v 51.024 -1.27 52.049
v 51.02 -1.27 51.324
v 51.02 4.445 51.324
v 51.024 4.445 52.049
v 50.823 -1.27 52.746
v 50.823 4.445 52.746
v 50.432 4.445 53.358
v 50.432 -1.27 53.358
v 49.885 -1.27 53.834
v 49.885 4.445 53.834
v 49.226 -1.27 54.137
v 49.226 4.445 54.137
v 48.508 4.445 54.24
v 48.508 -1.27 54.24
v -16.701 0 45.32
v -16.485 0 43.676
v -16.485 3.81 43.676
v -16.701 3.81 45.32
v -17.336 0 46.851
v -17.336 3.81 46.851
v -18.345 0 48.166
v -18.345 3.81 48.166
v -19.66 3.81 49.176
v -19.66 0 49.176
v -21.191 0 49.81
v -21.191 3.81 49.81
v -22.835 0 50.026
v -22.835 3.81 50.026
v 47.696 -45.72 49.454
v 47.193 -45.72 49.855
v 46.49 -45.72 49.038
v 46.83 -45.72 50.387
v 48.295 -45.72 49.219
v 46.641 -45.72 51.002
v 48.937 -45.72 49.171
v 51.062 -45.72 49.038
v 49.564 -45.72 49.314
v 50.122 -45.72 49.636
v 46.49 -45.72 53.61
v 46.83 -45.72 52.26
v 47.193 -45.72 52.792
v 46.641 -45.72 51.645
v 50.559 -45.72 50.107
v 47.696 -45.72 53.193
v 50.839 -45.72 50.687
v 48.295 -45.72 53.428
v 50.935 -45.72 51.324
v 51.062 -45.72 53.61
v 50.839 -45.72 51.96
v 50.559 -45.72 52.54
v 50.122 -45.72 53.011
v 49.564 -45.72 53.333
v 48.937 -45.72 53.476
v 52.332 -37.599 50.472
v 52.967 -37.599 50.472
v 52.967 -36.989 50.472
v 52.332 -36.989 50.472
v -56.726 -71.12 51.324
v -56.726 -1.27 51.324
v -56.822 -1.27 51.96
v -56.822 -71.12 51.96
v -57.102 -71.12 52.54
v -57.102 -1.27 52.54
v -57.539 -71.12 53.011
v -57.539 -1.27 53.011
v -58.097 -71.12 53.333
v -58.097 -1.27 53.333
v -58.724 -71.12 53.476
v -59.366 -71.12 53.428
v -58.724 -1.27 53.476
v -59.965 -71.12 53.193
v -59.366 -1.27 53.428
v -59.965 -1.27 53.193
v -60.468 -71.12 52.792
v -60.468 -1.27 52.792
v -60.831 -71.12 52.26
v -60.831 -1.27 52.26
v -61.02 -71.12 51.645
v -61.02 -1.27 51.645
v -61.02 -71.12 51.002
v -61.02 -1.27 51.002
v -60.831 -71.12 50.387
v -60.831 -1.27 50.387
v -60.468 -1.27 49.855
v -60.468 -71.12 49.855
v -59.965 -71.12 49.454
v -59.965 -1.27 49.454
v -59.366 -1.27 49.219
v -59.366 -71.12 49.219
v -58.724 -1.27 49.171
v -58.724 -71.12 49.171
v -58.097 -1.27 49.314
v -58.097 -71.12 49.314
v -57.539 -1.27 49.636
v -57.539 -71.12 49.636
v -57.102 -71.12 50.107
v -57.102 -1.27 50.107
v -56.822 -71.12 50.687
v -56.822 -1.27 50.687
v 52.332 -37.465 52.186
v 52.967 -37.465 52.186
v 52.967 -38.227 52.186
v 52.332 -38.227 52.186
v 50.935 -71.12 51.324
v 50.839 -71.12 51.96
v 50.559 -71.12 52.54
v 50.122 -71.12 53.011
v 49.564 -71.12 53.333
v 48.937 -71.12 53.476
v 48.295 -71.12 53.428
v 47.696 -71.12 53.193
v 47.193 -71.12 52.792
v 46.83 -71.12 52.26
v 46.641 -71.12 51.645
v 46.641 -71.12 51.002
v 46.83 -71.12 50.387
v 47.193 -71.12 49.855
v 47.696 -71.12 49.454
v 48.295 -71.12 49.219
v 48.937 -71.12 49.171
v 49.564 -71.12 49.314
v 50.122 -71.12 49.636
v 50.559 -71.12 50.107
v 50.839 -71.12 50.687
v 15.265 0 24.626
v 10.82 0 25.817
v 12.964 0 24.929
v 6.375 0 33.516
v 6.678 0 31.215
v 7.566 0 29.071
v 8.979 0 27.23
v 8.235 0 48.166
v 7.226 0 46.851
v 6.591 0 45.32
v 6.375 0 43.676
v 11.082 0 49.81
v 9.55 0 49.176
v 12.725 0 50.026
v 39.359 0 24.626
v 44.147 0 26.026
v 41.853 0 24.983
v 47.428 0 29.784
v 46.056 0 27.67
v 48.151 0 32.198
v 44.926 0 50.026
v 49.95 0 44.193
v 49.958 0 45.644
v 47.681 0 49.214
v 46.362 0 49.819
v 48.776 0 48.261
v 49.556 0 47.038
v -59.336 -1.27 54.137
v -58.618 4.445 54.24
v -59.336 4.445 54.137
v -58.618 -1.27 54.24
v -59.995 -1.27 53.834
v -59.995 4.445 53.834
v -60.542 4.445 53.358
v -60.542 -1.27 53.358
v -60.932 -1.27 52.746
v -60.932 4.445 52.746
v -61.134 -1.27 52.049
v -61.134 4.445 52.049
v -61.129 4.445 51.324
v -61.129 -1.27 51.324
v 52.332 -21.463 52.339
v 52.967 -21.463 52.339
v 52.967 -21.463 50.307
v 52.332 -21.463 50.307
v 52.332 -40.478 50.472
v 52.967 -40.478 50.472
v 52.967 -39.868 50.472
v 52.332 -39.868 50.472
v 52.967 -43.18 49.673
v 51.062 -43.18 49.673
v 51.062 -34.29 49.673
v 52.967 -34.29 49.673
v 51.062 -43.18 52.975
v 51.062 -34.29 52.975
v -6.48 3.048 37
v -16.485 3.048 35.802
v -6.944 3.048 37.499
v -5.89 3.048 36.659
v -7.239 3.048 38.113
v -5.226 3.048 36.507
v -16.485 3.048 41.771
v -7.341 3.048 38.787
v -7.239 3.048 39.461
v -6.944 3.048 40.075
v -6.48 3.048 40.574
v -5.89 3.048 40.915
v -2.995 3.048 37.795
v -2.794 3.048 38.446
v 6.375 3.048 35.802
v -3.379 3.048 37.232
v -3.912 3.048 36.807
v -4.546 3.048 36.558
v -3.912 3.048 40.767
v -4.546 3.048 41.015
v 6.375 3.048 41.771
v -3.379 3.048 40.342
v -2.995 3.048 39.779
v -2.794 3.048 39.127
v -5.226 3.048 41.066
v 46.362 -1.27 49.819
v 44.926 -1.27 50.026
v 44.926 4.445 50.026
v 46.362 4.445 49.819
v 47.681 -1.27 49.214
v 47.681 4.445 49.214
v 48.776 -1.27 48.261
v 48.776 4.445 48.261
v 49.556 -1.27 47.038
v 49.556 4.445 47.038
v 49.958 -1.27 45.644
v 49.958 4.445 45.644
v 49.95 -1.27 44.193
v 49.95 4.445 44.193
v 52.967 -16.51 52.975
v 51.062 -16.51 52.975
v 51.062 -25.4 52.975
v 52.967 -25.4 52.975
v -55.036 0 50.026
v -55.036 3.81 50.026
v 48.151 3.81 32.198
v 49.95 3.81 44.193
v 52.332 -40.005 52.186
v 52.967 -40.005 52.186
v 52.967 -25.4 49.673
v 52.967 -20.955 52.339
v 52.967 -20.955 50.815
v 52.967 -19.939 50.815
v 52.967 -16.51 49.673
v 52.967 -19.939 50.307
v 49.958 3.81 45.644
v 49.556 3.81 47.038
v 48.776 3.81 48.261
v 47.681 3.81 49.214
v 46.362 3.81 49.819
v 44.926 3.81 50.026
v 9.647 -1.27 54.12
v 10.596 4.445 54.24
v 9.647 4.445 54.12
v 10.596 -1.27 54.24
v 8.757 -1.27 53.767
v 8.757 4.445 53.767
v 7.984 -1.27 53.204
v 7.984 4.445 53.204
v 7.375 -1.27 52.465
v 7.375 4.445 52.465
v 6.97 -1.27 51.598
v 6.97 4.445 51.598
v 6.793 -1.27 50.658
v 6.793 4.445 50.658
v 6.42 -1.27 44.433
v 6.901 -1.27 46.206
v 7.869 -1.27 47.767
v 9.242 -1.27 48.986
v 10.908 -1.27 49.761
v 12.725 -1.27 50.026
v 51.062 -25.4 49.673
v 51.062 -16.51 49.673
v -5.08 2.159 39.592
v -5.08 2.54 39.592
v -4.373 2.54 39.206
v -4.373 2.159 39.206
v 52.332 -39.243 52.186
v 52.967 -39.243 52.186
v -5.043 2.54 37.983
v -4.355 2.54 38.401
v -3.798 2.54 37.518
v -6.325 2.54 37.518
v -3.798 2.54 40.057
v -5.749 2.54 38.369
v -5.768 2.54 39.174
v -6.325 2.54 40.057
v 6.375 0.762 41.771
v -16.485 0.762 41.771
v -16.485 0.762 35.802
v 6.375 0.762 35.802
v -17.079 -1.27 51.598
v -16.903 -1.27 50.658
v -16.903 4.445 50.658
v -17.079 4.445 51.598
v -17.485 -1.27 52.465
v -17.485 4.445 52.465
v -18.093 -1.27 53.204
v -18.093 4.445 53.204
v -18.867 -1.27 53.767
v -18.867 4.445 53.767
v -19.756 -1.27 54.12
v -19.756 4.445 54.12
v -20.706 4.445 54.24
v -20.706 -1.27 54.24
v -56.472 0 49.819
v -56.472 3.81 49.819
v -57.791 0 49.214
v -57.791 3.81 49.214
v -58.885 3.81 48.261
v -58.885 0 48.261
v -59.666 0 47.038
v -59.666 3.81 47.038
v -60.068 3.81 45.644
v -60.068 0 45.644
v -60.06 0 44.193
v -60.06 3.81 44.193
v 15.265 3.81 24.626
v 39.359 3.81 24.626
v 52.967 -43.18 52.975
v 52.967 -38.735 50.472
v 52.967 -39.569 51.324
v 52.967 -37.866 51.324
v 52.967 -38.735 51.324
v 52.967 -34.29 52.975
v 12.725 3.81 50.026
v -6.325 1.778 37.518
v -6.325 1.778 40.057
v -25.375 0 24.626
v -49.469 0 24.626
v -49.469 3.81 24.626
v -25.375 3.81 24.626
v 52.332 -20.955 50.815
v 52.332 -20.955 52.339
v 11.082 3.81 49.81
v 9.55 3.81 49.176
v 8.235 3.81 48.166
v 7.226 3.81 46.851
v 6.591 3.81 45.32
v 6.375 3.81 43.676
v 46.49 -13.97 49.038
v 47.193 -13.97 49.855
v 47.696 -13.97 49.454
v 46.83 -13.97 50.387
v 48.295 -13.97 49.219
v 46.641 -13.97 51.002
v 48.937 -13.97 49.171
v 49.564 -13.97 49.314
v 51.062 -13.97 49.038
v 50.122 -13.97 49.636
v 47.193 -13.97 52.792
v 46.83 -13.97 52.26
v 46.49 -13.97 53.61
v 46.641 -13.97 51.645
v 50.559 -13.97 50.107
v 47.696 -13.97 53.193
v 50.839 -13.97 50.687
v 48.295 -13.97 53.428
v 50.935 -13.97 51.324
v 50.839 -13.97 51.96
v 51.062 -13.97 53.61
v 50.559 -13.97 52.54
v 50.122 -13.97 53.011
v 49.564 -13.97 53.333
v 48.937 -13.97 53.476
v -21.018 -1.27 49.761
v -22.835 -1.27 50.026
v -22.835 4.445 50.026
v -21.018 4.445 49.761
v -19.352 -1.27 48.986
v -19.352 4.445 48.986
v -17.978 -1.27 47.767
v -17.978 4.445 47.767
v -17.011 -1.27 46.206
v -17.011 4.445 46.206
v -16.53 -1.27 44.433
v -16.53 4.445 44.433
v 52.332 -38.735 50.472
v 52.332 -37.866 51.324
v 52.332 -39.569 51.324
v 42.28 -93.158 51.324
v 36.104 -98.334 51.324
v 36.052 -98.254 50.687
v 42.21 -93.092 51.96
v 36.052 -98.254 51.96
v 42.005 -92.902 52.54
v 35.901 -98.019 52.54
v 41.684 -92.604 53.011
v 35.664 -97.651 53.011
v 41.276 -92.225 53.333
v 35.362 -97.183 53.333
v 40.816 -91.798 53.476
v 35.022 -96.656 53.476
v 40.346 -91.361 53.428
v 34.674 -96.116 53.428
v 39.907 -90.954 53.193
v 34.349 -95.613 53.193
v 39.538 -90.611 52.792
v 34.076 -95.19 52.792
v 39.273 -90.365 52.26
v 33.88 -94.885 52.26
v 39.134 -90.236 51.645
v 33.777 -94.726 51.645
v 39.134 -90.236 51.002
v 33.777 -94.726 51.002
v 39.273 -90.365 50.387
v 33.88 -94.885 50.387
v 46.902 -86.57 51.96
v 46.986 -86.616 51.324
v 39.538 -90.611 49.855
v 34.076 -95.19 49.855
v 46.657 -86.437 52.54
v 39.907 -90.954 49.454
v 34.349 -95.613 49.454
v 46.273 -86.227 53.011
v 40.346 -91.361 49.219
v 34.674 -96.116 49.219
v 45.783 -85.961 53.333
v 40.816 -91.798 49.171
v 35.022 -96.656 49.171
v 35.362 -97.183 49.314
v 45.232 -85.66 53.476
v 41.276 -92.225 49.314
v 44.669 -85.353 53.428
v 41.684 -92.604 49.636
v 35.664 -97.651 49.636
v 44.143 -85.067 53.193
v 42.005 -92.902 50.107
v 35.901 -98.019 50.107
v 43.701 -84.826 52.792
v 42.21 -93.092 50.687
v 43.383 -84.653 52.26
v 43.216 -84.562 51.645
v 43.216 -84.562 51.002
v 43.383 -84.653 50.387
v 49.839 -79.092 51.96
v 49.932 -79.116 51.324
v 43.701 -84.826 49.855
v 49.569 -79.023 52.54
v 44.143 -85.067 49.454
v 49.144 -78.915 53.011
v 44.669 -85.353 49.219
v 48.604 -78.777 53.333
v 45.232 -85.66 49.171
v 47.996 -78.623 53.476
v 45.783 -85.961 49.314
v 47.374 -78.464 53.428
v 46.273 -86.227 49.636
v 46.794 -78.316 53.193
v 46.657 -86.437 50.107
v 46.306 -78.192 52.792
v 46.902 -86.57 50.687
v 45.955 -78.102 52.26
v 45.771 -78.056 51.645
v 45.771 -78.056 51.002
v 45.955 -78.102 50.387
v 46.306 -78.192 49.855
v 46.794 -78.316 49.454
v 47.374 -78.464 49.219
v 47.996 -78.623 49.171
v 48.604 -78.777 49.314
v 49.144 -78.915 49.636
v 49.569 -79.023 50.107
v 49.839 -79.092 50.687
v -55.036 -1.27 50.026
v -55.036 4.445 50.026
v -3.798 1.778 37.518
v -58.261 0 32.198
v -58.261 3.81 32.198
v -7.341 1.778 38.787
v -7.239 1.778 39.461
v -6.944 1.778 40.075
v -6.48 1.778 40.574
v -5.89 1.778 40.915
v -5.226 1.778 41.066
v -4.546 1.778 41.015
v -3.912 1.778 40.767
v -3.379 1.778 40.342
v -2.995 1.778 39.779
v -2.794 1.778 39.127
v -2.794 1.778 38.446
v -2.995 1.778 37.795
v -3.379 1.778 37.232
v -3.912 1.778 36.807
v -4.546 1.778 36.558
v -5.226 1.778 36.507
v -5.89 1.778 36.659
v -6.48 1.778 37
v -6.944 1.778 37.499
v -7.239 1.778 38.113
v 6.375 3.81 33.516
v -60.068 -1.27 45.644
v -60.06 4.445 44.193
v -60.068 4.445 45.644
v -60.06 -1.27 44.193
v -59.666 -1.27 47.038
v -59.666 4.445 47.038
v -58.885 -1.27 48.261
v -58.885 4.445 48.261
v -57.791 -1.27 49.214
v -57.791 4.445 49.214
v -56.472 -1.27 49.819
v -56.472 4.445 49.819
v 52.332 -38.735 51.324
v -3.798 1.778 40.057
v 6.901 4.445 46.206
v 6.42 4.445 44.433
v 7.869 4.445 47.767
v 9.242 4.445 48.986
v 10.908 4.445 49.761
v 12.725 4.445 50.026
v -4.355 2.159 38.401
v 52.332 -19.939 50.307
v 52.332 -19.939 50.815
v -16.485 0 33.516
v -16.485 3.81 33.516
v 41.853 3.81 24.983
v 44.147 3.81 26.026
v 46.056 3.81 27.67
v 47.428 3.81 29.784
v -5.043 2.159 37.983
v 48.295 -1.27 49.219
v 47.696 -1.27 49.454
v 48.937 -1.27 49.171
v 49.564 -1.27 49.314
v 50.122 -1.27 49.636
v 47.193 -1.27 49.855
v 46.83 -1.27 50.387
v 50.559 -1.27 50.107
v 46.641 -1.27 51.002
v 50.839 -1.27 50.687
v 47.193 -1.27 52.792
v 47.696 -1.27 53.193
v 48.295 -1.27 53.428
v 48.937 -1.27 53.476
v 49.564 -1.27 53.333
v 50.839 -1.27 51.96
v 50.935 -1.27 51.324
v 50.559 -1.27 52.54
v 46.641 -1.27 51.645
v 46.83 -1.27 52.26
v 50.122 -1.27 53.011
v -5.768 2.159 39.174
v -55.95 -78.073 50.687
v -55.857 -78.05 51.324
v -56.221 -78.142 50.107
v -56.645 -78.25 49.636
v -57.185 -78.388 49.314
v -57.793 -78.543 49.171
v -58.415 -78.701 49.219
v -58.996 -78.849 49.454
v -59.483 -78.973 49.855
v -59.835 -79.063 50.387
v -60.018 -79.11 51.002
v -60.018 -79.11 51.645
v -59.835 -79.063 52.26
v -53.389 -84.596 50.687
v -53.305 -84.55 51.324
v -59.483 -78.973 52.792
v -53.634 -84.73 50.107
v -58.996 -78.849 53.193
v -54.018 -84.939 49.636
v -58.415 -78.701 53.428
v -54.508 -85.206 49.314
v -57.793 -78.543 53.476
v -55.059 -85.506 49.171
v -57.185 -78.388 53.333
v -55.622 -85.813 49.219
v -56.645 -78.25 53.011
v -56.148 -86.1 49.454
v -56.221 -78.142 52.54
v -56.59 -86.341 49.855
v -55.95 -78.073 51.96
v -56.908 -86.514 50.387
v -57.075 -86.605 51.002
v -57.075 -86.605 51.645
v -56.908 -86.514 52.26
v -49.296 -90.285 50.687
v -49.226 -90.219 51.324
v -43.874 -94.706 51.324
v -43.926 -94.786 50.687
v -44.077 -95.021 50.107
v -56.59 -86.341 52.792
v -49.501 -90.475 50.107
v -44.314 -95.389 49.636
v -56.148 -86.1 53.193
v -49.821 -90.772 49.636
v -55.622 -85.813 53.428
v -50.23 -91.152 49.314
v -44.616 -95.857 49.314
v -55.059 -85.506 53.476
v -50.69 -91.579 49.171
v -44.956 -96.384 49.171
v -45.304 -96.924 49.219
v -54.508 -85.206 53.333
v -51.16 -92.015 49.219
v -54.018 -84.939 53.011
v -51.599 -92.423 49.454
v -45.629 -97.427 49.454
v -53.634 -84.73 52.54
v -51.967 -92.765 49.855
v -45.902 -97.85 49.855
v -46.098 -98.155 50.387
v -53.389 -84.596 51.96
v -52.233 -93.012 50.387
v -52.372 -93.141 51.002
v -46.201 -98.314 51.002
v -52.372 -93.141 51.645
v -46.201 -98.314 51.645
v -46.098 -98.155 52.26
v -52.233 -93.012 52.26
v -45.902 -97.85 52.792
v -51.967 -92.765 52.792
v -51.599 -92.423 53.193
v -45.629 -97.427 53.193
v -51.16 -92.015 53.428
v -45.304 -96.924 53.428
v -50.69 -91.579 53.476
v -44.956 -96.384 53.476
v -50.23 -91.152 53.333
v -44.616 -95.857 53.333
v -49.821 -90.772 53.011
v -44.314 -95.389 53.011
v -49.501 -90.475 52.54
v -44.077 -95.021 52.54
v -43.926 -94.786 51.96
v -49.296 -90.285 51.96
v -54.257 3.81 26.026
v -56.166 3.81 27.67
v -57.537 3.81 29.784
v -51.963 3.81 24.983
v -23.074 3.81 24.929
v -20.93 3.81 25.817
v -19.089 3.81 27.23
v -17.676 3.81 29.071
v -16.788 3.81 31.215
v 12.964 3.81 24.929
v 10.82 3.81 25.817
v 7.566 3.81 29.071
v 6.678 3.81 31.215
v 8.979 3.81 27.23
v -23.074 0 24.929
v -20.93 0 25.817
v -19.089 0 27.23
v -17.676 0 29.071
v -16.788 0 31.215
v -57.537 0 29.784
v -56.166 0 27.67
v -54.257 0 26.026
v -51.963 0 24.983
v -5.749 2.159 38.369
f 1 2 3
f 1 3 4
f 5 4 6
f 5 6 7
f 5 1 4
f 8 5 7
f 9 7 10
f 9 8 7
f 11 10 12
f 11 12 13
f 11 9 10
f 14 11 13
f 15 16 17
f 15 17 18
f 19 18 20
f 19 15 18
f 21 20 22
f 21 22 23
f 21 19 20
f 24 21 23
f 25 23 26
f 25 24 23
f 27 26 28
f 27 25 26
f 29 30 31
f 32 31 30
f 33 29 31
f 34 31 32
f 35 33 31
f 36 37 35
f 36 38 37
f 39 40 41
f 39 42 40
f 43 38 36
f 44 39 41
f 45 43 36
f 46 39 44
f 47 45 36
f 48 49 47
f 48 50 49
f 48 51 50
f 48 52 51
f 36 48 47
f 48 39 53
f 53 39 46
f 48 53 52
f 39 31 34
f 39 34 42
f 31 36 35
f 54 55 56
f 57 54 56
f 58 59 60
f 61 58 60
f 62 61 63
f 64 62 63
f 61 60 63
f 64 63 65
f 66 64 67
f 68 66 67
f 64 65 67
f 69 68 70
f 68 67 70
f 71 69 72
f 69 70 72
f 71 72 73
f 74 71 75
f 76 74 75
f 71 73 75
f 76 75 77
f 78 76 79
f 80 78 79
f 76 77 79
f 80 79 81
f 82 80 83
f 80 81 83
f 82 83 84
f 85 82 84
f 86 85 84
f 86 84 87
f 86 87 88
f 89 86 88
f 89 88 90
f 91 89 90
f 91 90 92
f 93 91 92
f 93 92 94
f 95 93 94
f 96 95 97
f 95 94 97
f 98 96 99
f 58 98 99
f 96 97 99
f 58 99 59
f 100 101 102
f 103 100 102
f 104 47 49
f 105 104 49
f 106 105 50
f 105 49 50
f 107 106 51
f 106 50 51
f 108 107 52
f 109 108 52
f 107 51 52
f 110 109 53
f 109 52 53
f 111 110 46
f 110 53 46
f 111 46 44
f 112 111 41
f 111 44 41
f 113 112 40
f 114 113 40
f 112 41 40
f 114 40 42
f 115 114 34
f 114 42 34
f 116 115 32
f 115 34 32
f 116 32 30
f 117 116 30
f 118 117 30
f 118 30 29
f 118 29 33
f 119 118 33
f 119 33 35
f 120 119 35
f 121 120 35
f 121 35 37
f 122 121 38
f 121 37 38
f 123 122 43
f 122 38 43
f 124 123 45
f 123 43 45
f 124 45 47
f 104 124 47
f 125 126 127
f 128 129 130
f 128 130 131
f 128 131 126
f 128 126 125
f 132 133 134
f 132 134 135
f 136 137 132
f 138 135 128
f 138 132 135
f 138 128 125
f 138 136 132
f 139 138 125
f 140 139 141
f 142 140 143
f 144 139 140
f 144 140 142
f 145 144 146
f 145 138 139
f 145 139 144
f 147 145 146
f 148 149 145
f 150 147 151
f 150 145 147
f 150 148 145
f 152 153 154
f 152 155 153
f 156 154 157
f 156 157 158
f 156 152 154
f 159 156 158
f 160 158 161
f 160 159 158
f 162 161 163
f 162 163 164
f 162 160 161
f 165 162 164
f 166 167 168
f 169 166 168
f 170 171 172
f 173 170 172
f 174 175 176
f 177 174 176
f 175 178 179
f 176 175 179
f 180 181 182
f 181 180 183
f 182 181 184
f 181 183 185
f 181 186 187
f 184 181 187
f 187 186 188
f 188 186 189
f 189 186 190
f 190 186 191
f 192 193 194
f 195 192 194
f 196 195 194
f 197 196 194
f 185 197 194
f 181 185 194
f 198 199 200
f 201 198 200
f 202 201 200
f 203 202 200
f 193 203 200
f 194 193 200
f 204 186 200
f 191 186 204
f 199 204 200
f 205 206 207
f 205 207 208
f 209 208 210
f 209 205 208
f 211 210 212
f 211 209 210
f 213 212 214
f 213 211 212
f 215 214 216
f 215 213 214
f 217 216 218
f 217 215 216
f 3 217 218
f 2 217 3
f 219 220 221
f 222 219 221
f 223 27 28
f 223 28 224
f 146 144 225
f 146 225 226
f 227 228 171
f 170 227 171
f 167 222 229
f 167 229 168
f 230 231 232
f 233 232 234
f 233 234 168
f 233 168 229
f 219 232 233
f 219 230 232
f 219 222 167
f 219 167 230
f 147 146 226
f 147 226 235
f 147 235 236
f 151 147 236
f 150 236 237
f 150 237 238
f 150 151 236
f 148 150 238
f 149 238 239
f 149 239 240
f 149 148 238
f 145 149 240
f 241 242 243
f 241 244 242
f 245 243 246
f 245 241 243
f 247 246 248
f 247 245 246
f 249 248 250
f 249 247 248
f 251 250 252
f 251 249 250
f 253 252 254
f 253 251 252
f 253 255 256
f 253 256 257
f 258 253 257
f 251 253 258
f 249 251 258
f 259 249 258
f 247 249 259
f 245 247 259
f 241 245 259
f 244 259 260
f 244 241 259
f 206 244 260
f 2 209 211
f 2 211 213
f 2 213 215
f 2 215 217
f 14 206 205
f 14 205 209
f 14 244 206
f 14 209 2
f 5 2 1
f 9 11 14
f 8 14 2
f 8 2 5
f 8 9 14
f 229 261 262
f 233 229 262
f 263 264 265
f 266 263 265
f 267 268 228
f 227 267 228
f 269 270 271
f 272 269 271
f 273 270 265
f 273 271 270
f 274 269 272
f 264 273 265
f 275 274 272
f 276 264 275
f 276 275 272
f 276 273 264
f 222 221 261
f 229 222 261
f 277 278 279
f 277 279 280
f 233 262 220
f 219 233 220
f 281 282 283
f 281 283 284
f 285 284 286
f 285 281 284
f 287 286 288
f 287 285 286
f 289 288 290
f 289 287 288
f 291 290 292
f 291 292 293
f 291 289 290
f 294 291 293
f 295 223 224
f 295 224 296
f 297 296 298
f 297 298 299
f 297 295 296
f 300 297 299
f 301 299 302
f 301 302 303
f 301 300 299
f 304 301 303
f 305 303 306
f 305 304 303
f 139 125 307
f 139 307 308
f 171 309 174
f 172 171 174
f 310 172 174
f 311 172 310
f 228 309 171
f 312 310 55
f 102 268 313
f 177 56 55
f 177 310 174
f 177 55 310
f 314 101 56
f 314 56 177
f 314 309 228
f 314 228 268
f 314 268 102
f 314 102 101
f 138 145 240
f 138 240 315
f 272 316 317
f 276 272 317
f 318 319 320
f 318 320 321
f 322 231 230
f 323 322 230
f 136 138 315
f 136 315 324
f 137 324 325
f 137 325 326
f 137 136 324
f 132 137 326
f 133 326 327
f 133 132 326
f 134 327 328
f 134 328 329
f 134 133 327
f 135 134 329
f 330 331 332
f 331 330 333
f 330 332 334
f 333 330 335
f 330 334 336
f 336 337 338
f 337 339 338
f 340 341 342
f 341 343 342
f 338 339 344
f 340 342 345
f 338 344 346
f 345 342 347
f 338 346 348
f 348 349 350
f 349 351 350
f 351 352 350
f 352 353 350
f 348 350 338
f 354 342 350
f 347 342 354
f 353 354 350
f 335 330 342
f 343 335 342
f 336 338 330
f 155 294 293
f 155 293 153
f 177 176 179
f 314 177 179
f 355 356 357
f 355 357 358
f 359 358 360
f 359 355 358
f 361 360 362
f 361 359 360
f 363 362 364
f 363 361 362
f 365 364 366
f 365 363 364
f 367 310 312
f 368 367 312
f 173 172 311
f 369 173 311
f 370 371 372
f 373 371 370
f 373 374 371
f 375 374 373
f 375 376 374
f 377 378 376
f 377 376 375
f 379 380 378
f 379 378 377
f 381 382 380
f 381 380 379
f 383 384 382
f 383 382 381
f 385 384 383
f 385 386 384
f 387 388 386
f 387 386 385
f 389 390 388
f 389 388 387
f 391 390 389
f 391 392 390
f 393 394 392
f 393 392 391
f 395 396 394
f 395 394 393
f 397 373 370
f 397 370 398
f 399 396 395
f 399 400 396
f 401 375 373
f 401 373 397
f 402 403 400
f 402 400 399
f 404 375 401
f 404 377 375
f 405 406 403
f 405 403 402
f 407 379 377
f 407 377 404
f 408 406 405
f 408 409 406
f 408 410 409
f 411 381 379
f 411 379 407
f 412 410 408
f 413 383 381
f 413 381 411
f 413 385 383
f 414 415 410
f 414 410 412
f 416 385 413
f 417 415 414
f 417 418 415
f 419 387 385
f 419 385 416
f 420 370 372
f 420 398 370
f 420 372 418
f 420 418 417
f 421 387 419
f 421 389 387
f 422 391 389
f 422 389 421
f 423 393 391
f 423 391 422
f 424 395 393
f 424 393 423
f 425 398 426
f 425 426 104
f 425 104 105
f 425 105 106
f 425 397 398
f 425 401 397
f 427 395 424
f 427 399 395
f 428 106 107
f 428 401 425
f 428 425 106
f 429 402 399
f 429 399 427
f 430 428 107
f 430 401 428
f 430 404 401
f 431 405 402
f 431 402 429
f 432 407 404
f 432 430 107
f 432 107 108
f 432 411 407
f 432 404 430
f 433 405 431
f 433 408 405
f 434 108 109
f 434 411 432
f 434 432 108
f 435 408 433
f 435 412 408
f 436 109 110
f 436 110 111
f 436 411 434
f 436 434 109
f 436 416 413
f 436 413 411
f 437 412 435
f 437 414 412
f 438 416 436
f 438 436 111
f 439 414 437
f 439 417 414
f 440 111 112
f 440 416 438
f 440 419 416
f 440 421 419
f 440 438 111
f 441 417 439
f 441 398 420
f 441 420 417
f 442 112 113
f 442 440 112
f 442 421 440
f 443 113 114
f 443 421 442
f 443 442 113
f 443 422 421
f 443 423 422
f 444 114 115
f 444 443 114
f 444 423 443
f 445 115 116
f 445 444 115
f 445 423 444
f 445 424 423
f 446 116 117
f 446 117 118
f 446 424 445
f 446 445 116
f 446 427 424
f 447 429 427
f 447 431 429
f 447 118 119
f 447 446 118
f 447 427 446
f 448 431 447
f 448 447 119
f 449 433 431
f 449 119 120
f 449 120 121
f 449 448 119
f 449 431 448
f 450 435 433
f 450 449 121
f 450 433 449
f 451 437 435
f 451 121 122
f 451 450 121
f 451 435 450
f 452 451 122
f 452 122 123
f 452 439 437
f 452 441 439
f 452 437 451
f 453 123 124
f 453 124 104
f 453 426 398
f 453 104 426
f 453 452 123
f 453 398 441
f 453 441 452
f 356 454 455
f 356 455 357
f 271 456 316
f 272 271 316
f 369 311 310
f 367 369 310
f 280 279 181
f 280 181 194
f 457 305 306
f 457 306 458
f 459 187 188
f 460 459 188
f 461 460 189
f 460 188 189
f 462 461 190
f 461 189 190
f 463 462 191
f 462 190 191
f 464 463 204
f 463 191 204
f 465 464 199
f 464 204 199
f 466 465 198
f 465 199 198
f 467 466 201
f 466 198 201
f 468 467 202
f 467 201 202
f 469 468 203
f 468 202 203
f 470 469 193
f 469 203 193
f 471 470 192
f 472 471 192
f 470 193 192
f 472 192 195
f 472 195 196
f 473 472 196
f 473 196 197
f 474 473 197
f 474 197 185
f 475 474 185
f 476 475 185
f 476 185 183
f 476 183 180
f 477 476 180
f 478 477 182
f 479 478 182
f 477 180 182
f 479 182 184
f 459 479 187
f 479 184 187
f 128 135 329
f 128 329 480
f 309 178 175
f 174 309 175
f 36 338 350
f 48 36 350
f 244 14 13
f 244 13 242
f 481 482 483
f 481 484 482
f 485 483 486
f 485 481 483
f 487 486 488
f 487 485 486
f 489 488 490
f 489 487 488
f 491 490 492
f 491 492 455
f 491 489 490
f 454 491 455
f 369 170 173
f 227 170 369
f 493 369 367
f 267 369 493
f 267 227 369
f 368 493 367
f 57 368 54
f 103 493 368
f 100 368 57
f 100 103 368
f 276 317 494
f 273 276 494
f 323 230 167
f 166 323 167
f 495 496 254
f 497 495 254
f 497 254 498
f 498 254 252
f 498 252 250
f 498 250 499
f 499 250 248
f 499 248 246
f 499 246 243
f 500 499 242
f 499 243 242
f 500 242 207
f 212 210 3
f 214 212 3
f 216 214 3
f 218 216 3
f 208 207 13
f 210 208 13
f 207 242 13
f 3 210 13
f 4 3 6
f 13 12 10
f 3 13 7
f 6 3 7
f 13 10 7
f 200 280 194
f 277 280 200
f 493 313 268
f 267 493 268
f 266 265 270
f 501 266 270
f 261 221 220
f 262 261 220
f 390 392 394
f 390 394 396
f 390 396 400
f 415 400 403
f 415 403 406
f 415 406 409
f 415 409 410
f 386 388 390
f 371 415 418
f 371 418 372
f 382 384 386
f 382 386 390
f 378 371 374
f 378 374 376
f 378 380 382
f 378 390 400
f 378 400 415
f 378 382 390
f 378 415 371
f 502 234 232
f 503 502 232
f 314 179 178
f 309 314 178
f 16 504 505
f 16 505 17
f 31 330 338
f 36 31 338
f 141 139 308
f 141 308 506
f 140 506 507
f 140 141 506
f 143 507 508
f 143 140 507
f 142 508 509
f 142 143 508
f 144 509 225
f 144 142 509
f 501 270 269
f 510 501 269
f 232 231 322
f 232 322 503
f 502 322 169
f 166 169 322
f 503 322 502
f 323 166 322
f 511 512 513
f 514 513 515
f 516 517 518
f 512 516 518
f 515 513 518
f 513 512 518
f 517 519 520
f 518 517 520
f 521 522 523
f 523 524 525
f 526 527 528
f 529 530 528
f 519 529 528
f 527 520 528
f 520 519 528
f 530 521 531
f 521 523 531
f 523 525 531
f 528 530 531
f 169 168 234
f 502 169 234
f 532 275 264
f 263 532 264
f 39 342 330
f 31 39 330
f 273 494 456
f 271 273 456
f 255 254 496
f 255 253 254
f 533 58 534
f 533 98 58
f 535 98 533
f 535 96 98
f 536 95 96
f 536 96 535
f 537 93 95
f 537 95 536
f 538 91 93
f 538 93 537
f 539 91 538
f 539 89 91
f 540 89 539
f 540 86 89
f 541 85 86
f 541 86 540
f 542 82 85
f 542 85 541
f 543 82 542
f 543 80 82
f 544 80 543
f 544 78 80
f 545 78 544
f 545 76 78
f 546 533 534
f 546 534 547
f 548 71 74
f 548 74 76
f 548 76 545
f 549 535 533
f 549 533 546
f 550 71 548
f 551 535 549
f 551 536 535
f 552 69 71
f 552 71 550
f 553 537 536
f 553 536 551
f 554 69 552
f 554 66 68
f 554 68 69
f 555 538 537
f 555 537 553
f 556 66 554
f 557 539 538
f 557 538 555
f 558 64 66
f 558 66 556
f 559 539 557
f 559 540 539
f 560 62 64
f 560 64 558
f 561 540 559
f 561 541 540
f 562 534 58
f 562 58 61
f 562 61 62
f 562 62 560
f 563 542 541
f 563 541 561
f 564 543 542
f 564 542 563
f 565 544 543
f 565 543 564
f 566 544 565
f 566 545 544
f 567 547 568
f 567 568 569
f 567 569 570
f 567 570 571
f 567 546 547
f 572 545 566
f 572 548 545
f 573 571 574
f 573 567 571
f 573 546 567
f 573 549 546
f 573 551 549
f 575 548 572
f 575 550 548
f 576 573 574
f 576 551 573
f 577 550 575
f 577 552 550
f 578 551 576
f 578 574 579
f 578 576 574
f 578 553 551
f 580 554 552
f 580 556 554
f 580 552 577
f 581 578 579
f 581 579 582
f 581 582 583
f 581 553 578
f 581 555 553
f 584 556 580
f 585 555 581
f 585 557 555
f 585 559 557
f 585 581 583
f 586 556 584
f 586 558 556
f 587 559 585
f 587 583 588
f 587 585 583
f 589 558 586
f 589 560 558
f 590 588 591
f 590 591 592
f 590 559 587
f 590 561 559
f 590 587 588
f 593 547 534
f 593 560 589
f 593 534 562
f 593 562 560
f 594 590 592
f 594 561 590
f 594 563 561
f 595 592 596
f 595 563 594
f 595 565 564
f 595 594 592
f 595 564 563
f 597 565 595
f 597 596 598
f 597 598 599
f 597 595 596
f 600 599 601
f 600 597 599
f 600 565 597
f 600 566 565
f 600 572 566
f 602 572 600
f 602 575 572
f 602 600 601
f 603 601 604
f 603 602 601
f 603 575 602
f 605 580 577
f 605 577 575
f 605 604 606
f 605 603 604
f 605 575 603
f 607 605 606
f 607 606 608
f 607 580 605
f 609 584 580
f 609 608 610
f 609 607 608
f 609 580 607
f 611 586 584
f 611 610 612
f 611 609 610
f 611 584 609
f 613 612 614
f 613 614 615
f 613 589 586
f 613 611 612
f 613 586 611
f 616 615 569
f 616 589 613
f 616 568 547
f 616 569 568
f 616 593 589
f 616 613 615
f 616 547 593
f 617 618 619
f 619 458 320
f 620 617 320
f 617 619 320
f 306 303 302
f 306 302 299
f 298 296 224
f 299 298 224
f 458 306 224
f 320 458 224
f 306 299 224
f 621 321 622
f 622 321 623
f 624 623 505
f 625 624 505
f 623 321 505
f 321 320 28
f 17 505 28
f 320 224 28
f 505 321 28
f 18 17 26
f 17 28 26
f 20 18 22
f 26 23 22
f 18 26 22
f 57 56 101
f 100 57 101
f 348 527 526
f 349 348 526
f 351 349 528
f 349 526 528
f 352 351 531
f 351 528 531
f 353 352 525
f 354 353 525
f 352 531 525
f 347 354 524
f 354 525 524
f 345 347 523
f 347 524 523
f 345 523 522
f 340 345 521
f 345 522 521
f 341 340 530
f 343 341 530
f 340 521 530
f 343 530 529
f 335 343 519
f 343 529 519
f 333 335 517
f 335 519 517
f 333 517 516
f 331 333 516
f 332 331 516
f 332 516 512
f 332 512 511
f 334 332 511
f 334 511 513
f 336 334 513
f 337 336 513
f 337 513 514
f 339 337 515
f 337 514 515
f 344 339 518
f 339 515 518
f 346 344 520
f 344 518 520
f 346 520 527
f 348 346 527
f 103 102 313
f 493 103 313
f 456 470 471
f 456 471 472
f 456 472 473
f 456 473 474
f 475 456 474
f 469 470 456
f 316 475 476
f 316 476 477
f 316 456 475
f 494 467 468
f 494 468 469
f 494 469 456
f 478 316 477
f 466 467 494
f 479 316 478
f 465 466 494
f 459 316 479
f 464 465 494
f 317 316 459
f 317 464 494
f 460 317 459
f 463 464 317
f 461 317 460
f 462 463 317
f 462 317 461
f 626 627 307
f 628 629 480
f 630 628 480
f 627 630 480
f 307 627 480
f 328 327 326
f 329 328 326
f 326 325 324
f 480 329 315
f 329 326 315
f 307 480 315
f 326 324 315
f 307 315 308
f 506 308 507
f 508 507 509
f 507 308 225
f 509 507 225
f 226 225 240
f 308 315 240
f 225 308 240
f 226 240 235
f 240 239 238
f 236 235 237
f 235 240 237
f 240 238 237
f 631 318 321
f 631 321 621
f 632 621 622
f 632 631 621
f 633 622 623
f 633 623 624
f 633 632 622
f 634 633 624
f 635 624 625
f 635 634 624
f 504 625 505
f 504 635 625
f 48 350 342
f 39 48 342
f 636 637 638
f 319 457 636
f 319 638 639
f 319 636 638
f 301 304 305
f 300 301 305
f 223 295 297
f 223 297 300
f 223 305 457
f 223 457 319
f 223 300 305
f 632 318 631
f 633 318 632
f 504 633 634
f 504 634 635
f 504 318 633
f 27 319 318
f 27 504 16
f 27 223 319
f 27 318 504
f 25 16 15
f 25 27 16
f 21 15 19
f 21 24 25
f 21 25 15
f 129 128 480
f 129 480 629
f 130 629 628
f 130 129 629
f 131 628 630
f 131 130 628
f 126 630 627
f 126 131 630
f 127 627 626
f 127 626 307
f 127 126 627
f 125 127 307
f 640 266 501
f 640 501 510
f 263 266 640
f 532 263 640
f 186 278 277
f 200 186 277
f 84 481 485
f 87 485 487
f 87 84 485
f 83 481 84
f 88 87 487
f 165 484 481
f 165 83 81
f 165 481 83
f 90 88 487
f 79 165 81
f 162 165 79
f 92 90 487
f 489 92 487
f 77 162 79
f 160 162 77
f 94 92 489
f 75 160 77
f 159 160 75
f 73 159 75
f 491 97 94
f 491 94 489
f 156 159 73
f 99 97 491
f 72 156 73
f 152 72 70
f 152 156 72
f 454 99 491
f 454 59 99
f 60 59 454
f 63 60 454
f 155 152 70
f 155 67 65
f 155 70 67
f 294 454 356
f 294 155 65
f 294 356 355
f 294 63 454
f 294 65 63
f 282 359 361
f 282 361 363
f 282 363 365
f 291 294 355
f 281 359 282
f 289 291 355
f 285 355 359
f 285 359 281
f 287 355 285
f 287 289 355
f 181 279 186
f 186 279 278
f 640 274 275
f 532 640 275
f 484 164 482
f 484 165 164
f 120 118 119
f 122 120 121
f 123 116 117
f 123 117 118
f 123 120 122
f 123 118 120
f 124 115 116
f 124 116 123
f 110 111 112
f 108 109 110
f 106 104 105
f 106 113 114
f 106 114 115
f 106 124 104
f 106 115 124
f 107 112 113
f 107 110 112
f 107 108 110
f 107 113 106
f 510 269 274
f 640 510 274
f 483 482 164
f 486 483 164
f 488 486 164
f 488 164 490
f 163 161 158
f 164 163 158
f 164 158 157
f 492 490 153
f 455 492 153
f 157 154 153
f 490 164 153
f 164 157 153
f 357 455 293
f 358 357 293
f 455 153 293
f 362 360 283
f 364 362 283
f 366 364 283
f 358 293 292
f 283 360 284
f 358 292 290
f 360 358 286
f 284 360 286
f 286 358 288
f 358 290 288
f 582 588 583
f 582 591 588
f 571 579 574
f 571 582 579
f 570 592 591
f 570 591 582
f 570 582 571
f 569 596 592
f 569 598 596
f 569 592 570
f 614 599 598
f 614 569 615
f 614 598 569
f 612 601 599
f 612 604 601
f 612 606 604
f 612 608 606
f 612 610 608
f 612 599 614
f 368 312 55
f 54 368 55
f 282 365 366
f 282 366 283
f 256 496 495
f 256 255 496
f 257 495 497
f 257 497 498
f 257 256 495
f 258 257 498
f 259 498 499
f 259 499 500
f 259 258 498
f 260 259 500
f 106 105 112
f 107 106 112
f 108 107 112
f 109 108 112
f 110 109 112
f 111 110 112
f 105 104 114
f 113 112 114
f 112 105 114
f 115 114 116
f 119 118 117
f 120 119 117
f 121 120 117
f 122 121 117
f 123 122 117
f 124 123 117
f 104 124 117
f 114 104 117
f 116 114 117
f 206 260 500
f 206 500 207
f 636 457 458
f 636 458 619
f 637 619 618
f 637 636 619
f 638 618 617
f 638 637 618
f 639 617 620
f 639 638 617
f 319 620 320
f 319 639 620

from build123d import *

# Parameters (mm, degrees)
F1_DEPTH      = 3.81
F0_W          = 22.86
F0_H          = 5.969
F2_DEPTH      = 3.048
F3_DEPTH      = 0.762
F5_DEPTH      = 1.27
F5_DEPTH_BACK = 4.445
F6_R          = 2.159
F7_DEPTH      = 69.85
F8_DEPTH      = 12.7
F10_DEPTH     = 31.75
F11_R         = 2.159
F12_DEPTH     = 25.4
F13_R         = 2.286
F14_DEPTH     = 1.27
F16_DEPTH     = 0.762
F18_DEPTH     = 0.381
F19_DEPTH     = 5.08
F21_W         = 5.3975
F21_H         = 1.651
F21_W_2       = 3.4925
F22_DEPTH     = 1.905
F23_W         = 1.016
F23_H         = 0.508
F24_DEPTH     = 0.635
F26_DEPTH     = 0.635
F27_R         = 2.159
F30_R         = 2.159


with BuildPart() as f1:
    # F0 (on Front) → F1 (new body)
    with BuildSketch(Plane.XZ):
        with BuildLine():
            Line((-22.8348751962, 50.0262716477), (-55.0360430985, 50.0262716477))
            ThreePointArc((-55.0360430985, 50.0262716477), (-58.8853633674, 48.2612578419), (-60.0598397711, 44.1927021468))
            Line((-60.0598397711, 44.1927021468), (-58.2605632022, 32.1975250211))
            ThreePointArc((-58.2605632022, 32.1975250211), (-55.2701448651, 26.7799611772), (-49.4689190252, 24.6262716477))
            Line((-49.4689190252, 24.6262716477), (-25.3748751962, 24.6262716477))
            ThreePointArc((-25.3748751962, 24.6262716477), (-19.0886959115, 27.2300923629), (-16.4848751962, 33.5162716477))
            Line((-16.4848751962, 33.5162716477), (-16.4848751962, 35.8022716477))
            Line((-16.4848751962, 35.8022716477), (-16.4848751962, 41.7712716477))
            Line((-16.4848751962, 41.7712716477), (-16.4848751962, 43.6762716477))
            ThreePointArc((-16.4848751962, 43.6762716477), (-18.3447471357, 48.1663997082), (-22.8348751962, 50.0262716477))
        make_face()
    extrude(amount=-F1_DEPTH)


with BuildPart() as f1b:
    # F0 (on Front) → F1, piece 2 (new body)
    with BuildSketch(Plane.XZ):
        with BuildLine():
            Line((6.3751248038, 43.6762716477), (6.3751248038, 41.7712716477))
            Line((6.3751248038, 41.7712716477), (6.3751248038, 35.8022716477))
            Line((6.3751248038, 35.8022716477), (6.3751248038, 33.5162716477))
            ThreePointArc((6.3751248038, 33.5162716477), (8.978945519, 27.2300923629), (15.2651248038, 24.6262716477))
            Line((15.2651248038, 24.6262716477), (39.3591686328, 24.6262716477))
            ThreePointArc((39.3591686328, 24.6262716477), (45.1603944727, 26.7799611772), (48.1508128098, 32.1975250211))
            Line((48.1508128098, 32.1975250211), (49.9500893786, 44.1927021468))
            ThreePointArc((49.9500893786, 44.1927021468), (48.7756129749, 48.2612578419), (44.9262927061, 50.0262716477))
            Line((44.9262927061, 50.0262716477), (12.7251248038, 50.0262716477))
            ThreePointArc((12.7251248038, 50.0262716477), (8.2349967432, 48.1663997082), (6.3751248038, 43.6762716477))
        make_face()
    extrude(amount=-F1_DEPTH)


with BuildPart() as f2:
    # F0 (on Front) → F2 (new body)
    with BuildSketch(Plane.XZ):
        with Locations((-5.0548751962, 38.7867716477)):
            Rectangle(F0_W, F0_H)
    extrude(amount=-F2_DEPTH)

    # F3 (cut): a face of the model
    f3_faces = [f2.faces().sort_by_distance(p)[0] for p in [
        (-5.0548751962, 0, 38.7867716477),
    ]]
    extrude(f3_faces, amount=-F3_DEPTH, mode=Mode.SUBTRACT)

    # F13 (on face) → F14 (cut)
    with BuildSketch(Plane(origin=(0, 3.048, 0), x_dir=(-1, 0, 0), z_dir=(0, 1, 0))):
        with Locations((5.0548751962, 38.7867716477)):
            Circle(F13_R)
    extrude(amount=-F14_DEPTH, mode=Mode.SUBTRACT)

    # F15 (on face) → F16 (join)
    with BuildSketch(Plane(origin=(0, 1.778, 0), x_dir=(-1, 0, 0), z_dir=(0, 1, 0))):
        Polygon((6.3248751962, 37.5182032585), (6.3248751962, 38.7867716477), (6.3248751962, 40.0567716477), (3.7975497544, 40.0567716477), (3.7975497544, 37.5182032585), align=None)
    extrude(amount=F16_DEPTH)

    # F17 (on face) → F18 (cut)
    with BuildSketch(Plane(origin=(0, 2.54, 0), x_dir=(-1, 0, 0), z_dir=(0, 1, 0))):
        Polygon((5.0427413614, 37.9825571542), (5.7490670054, 38.3690258498), (5.7675381194, 39.1739561486), (5.0796835892, 39.592417752), (4.3733579452, 39.2059490565), (4.3548868312, 38.4010187576), align=None)
    extrude(amount=-F18_DEPTH, mode=Mode.SUBTRACT)


with BuildPart() as f5:
    # F4 (on Front) → F5 (new body, two sides)
    with BuildSketch(Plane.XZ) as f5_sk:
        with BuildLine():
            ThreePointArc((-60.0598397711, 44.1927021468), (-58.8853633674, 48.2612578419), (-55.0360430985, 50.0262716477))
            Line((-55.0360430985, 50.0262716477), (-22.8348751962, 50.0262716477))
            ThreePointArc((-22.8348751962, 50.0262716477), (-18.6209529466, 48.4265726144), (-16.530182618, 44.4334714191))
            Line((-16.530182618, 44.4334714191), (-16.9026220807, 50.6578617088))
            ThreePointArc((-16.9026220807, 50.6578617088), (-18.0934385378, 53.2036623345), (-20.7058198953, 54.240295492))
            Line((-20.7058198953, 54.240295492), (-58.617562724, 54.240295492))
            ThreePointArc((-58.617562724, 54.240295492), (-60.5422228584, 53.3577885891), (-61.1294610603, 51.3235107415))
            Line((-61.1294610603, 51.3235107415), (-60.0598397711, 44.1927021468))
        make_face()
    extrude(amount=F5_DEPTH)
    extrude(f5_sk.sketch, amount=-F5_DEPTH_BACK)

    # F6 (on face) → F7 (join)
    with BuildSketch(Plane.XZ.offset(1.27)):
        with Locations((-58.8853633674, 51.3235107415)):
            Circle(F6_R)
    extrude(amount=F7_DEPTH)

    # F32: sweep along a path in F31
    with BuildLine(Plane.XY) as f32_path:
        ThreePointArc((-58.8853633674, -71.12), (-55.2003530631, -85.5832963729), (-45.043840045, -96.52))
    # F30 (on face) → F32 (sweep)
    with BuildSketch(Plane.XZ.offset(71.12)):
        with Locations((-58.8853633674, 51.3235107415)):
            Circle(F30_R)
    sweep(path=f32_path.line)


with BuildPart() as f5b:
    # F4 (on Front) → F5, piece 2 (new body, two sides)
    with BuildSketch(Plane.XZ) as f5_2_sk:
        with BuildLine():
            ThreePointArc((6.4204322255, 44.4334714191), (8.5112025542, 48.4265726144), (12.7251248038, 50.0262716477))
            Line((12.7251248038, 50.0262716477), (44.9262927061, 50.0262716477))
            ThreePointArc((44.9262927061, 50.0262716477), (48.7756129749, 48.2612578419), (49.9500893786, 44.1927021468))
            Line((49.9500893786, 44.1927021468), (51.0197106679, 51.3235107415))
            ThreePointArc((51.0197106679, 51.3235107415), (50.432472466, 53.3577885891), (48.5078123316, 54.240295492))
            Line((48.5078123316, 54.240295492), (10.5960695028, 54.240295492))
            ThreePointArc((10.5960695028, 54.240295492), (7.9836881454, 53.2036623345), (6.7928716882, 50.6578617088))
            Line((6.7928716882, 50.6578617088), (6.4204322255, 44.4334714191))
        make_face()
    extrude(amount=F5_DEPTH)
    extrude(f5_2_sk.sketch, amount=-F5_DEPTH_BACK)


with BuildPart() as f8:
    # F6 (on face) → F8 (new body)
    with BuildSketch(Plane.XZ.offset(1.27)):
        with Locations((48.7756129749, 51.3235107415)):
            Circle(F6_R)
    extrude(amount=F8_DEPTH)

    # F9 (on face) → F10 (join)
    with BuildSketch(Plane.XZ.offset(13.97)):
        with BuildLine():
            Line((46.4896129749, 51.3235107415), (46.6166129749, 51.3235107415))
            ThreePointArc((46.6166129749, 51.3235107415), (48.7756129749, 53.4825107415), (50.9346129749, 51.3235107415))
            ThreePointArc((50.9346129749, 51.3235107415), (50.3022565155, 49.7968672009), (48.7756129749, 49.1645107415))
            Line((48.7756129749, 49.1645107415), (48.7756129749, 49.0375107415))
            Line((48.7756129749, 49.0375107415), (51.0616129749, 49.0375107415))
            Line((51.0616129749, 49.0375107415), (51.0616129749, 53.6095107415))
            Line((51.0616129749, 53.6095107415), (46.4896129749, 53.6095107415))
            Line((46.4896129749, 53.6095107415), (46.4896129749, 51.3235107415))
        make_face()
        with BuildLine():
            Line((46.6166129749, 51.3235107415), (48.7756129749, 51.3235107415))
            Line((48.7756129749, 51.3235107415), (48.7756129749, 49.1645107415))
            ThreePointArc((48.7756129749, 49.1645107415), (50.3022565155, 49.7968672009), (50.9346129749, 51.3235107415))
            ThreePointArc((50.9346129749, 51.3235107415), (48.7756129749, 53.4825107415), (46.6166129749, 51.3235107415))
        make_face()
        with BuildLine():
            Line((48.7756129749, 49.1645107415), (48.7756129749, 51.3235107415))
            Line((48.7756129749, 51.3235107415), (46.6166129749, 51.3235107415))
            ThreePointArc((46.6166129749, 51.3235107415), (47.2489694344, 49.7968672009), (48.7756129749, 49.1645107415))
        make_face()
        with BuildLine():
            ThreePointArc((48.7756129749, 49.1645107415), (47.2489694344, 49.7968672009), (46.6166129749, 51.3235107415))
            Line((46.6166129749, 51.3235107415), (46.4896129749, 51.3235107415))
            Line((46.4896129749, 51.3235107415), (46.4896129749, 49.0375107415))
            Line((46.4896129749, 49.0375107415), (48.7756129749, 49.0375107415))
            Line((48.7756129749, 49.0375107415), (48.7756129749, 49.1645107415))
        make_face()
    extrude(amount=F10_DEPTH)

    # F11 (on face) → F12 (join)
    with BuildSketch(Plane.XZ.offset(45.72)):
        with Locations((48.7756129749, 51.3235107415)):
            Circle(F11_R)
    extrude(amount=F12_DEPTH)


with BuildPart() as f19:
    # F19 (new): a face of the model
    f19_faces = [f8.part.faces().sort_by_distance(p)[0] for p in [
        (48.7756129749, -71.12, 51.3235107415),
    ]]
    extrude(f19_faces, amount=F19_DEPTH)


with BuildPart() as f22:
    # F21 (on face) → F22 (new body)
    with BuildSketch(Plane.YZ.offset(51.0616129749)):
        with Locations((-40.48125, 52.1490107415)):
            Rectangle(F21_W, F21_H)
        with Locations((-40.48125, 50.4980107415)):
            Rectangle(F21_W, F21_H)
        with Locations((-36.03625, 52.1490107415)):
            Rectangle(F21_W_2, F21_H)
        with Locations((-36.03625, 50.4980107415)):
            Rectangle(F21_W_2, F21_H)
    extrude(amount=F22_DEPTH)

    # F25 (on face) → F26 (cut)
    with BuildSketch(Plane.YZ.offset(52.9666129749)):
        Polygon((-38.735, 50.4724252605), (-38.735, 51.3235107415), (-39.243, 52.1856099367), (-40.005, 52.1856099367), (-40.4775483483, 50.4724252605), (-39.8679483483, 50.4724252605), (-39.5686626434, 51.3235107415), align=None)
        Polygon((-38.227, 52.1856099367), (-38.735, 51.3235107415), (-38.735, 50.4724252605), (-37.866127559, 51.3235107415), (-37.598908645, 50.4724252605), (-36.989308645, 50.4724252605), (-37.465, 52.1856099367), align=None)
    extrude(amount=-F26_DEPTH, mode=Mode.SUBTRACT)


with BuildPart() as f22b:
    # F21 (on face) → F22, piece 2 (new body)
    with BuildSketch(Plane.YZ.offset(51.0616129749)):
        with Locations((-23.65375, 52.1490107415)):
            Rectangle(F21_W_2, F21_H)
        with Locations((-23.65375, 50.4980107415)):
            Rectangle(F21_W_2, F21_H)
        with Locations((-19.20875, 52.1490107415)):
            Rectangle(F21_W, F21_H)
        with Locations((-19.20875, 50.4980107415)):
            Rectangle(F21_W, F21_H)
    extrude(amount=F22_DEPTH)

    # F23 (on face) → F24 (cut)
    with BuildSketch(Plane.YZ.offset(52.9666129749)):
        Polygon((-20.955, 50.8147187965), (-20.955, 52.3387187965), (-21.463, 52.3387187965), (-21.463, 50.3067187965), (-20.955, 50.3067187965), align=None)
        with Locations((-20.447, 50.5607187965)):
            Rectangle(F23_W, F23_H)
    extrude(amount=-F24_DEPTH, mode=Mode.SUBTRACT)


with BuildPart() as f29:
    # F29: sweep along a path in F28
    with BuildLine(Plane.XY) as f29_path:
        ThreePointArc((34.9340896526, -96.52), (45.0906026707, -85.5832963729), (48.7756129749, -71.12))
    # F27 (on face) → F29 (sweep)
    with BuildSketch(Plane.XZ.offset(71.12)):
        with Locations((48.7756129749, 51.3235107415)):
            Circle(F27_R)
    sweep(path=f29_path.line)


solid = Compound([f1.part, f1b.part, f2.part, f5.part, f5b.part, f8.part, f22.part, f22b.part, f29.part])
